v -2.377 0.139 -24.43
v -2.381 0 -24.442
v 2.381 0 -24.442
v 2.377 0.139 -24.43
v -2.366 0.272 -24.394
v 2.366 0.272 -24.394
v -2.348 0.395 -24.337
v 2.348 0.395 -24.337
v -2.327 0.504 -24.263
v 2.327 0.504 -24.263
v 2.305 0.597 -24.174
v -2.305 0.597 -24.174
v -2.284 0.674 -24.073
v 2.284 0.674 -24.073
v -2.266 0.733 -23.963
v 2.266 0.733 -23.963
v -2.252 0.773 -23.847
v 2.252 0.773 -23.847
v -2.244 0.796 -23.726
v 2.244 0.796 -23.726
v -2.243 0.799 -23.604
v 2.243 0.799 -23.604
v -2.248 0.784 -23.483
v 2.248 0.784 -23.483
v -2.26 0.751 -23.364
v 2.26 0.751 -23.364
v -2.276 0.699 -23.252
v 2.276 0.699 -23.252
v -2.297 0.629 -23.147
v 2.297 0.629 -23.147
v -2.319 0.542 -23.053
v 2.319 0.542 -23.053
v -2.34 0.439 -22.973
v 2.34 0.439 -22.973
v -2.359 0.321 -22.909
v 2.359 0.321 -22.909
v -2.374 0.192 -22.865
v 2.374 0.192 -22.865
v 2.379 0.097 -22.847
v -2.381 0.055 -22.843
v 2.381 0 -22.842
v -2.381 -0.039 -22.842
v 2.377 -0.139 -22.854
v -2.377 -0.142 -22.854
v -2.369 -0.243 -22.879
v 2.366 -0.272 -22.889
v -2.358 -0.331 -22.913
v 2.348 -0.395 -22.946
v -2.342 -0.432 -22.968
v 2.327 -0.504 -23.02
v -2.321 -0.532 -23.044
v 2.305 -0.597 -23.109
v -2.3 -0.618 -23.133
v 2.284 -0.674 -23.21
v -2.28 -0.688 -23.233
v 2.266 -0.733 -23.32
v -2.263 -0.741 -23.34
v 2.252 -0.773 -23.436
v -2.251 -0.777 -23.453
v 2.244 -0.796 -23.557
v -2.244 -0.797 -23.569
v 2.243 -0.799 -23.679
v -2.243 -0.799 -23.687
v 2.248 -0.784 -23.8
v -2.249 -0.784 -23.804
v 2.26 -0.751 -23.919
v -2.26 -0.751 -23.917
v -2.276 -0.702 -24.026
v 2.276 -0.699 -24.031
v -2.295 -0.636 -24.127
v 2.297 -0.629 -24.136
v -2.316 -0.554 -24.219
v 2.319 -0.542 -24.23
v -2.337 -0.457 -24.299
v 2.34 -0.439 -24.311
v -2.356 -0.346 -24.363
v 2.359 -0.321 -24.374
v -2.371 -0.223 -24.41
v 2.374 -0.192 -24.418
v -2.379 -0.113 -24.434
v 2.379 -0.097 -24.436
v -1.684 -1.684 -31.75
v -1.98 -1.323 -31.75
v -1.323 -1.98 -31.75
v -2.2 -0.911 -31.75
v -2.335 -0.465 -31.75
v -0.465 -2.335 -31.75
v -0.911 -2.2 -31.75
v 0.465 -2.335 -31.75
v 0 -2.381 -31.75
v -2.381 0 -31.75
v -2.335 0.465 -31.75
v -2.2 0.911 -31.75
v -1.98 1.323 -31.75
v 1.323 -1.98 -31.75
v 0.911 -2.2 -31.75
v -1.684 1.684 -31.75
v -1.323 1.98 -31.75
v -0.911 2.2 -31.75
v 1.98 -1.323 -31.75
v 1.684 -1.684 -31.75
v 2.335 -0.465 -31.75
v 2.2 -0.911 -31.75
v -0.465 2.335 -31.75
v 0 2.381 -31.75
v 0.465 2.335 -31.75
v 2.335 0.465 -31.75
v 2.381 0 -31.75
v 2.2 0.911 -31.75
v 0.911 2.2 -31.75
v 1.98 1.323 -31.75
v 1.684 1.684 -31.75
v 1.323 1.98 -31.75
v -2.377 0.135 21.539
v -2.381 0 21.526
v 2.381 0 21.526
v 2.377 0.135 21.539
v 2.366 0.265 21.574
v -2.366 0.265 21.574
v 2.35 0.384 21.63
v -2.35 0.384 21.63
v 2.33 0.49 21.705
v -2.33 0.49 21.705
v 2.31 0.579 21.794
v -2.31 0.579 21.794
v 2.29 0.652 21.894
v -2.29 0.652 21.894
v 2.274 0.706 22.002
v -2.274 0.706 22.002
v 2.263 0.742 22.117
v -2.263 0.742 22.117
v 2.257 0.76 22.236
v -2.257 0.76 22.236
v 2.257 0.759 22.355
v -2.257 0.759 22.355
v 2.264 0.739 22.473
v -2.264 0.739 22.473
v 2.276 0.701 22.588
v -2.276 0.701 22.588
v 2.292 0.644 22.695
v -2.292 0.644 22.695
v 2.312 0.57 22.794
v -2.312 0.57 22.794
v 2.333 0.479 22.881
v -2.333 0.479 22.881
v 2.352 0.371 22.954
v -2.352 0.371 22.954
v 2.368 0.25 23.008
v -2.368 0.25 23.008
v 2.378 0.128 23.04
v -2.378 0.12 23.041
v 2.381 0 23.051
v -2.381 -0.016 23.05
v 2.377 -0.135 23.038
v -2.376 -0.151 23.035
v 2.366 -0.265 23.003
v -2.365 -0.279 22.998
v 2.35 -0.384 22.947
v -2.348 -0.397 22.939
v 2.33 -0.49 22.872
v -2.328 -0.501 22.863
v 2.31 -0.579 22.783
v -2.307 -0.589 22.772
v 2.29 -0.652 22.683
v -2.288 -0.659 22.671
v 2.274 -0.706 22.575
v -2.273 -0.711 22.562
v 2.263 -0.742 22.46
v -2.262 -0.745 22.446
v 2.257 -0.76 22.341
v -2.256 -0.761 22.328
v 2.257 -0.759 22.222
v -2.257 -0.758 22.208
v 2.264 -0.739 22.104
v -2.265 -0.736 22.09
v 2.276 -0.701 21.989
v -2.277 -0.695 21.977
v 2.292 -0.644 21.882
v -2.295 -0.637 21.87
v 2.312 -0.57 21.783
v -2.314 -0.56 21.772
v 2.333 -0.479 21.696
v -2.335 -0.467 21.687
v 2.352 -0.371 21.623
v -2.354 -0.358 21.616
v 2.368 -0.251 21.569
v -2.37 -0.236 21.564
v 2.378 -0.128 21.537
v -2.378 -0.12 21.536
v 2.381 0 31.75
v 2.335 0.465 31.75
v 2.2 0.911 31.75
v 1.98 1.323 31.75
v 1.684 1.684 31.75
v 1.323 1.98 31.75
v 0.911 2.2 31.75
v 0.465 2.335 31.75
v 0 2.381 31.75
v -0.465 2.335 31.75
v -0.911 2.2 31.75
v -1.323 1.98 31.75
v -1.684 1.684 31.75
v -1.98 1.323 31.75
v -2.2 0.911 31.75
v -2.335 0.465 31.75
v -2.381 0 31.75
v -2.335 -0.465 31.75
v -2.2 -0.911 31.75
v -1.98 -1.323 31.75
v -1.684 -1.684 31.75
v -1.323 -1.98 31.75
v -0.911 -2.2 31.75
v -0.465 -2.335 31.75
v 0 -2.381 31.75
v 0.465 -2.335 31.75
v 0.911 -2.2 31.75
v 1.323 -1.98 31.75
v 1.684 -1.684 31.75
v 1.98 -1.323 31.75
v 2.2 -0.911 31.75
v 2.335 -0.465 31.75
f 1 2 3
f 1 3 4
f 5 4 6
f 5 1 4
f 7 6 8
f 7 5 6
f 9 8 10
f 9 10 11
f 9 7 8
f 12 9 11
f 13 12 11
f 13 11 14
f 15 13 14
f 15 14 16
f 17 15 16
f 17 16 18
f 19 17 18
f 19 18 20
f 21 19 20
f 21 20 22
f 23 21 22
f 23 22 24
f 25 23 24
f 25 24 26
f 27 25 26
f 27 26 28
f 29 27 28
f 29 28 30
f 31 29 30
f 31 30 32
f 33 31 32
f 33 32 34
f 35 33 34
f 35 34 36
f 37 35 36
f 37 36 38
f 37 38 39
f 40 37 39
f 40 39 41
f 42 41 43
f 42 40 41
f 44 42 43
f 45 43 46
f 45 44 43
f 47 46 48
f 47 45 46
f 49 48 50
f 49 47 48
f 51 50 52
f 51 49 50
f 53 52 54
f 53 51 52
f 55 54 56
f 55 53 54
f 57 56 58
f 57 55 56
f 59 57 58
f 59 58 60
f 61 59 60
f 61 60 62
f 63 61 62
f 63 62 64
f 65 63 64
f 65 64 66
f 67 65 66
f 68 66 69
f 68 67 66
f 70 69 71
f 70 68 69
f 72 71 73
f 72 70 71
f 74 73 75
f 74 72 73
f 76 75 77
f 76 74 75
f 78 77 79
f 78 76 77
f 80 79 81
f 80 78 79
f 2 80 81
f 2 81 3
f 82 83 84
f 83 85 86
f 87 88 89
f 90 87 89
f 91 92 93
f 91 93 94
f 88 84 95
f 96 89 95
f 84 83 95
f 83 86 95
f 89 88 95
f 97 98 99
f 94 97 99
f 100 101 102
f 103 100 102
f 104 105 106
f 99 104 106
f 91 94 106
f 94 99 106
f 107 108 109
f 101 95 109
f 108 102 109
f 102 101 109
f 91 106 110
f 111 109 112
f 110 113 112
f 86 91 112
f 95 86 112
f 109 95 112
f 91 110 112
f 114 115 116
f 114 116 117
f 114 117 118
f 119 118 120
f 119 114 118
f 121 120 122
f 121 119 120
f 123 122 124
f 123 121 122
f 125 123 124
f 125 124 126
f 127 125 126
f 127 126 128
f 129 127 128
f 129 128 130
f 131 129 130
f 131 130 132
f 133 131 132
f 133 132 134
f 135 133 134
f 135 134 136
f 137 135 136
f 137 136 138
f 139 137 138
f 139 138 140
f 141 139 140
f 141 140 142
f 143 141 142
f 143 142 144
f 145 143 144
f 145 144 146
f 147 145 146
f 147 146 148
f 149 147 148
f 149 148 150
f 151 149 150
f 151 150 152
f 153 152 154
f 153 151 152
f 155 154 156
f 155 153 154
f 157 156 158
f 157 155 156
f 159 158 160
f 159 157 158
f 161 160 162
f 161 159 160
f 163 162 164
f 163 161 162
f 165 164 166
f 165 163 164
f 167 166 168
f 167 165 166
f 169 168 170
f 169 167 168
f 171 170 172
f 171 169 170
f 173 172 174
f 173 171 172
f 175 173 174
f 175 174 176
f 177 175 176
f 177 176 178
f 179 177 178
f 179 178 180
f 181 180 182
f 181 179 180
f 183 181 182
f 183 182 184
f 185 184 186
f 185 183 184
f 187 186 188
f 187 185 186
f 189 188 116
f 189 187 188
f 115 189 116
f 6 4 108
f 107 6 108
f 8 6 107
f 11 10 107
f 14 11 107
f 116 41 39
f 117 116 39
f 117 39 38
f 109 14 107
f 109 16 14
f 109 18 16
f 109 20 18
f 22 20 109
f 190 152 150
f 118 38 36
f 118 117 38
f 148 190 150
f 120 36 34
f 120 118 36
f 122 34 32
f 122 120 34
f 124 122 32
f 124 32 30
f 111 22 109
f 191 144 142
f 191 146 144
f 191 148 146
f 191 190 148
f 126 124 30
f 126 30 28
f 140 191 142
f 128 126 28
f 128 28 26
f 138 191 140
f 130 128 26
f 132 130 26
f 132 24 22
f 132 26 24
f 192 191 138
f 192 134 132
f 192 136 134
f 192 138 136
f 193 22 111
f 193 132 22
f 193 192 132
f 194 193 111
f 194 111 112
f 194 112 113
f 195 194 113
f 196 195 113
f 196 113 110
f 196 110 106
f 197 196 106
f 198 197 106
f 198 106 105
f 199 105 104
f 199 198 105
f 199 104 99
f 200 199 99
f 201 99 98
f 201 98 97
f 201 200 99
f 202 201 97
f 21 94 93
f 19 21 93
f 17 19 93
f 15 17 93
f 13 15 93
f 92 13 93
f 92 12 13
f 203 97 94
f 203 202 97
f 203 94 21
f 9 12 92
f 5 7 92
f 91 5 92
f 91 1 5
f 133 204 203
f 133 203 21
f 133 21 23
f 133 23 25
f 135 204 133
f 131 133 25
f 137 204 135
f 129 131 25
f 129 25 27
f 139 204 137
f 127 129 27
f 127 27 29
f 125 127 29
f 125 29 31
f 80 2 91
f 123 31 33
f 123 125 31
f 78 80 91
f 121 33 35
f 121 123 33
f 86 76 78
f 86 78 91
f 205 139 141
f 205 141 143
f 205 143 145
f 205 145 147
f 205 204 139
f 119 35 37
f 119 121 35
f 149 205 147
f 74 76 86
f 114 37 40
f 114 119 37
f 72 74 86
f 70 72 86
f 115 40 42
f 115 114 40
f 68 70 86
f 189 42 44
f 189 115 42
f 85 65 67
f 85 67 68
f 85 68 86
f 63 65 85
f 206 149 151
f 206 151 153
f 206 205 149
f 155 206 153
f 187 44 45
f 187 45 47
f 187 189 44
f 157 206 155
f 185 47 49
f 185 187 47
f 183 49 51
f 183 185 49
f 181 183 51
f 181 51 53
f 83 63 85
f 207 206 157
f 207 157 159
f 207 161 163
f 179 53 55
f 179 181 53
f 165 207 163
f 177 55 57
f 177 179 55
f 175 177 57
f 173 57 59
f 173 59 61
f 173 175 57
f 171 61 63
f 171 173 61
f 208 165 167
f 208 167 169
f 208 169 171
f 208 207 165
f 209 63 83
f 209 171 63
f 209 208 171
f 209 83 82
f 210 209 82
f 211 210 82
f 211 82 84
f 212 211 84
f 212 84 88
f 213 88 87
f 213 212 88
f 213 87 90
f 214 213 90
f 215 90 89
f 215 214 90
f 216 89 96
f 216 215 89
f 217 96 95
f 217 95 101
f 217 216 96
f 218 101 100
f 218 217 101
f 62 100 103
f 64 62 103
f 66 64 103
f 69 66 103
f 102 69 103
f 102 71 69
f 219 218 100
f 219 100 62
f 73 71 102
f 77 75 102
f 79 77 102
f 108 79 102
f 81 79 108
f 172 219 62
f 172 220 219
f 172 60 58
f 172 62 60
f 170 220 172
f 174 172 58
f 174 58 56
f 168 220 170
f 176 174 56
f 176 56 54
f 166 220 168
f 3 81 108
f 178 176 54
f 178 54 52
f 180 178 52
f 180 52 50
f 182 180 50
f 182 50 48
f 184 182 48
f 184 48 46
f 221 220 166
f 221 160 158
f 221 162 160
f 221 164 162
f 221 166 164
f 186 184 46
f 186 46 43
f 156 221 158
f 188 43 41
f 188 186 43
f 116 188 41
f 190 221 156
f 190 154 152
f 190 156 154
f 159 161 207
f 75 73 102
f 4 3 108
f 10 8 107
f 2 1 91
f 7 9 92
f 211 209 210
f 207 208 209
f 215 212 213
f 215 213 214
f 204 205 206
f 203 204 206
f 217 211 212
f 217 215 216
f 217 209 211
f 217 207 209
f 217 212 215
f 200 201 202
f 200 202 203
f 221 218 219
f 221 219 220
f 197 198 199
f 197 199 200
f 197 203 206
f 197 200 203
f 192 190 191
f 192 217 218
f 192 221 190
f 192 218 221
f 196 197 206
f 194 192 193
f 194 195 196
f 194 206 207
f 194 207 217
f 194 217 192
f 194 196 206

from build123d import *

# Parameters (mm, degrees)
SKETCH1_R               = 2.38125
BOSS_EXTRUDE1_DEPTH     = 31.75
CUT_EXTRUDE3_DEPTH      = 32.928094261
CUT_EXTRUDE3_DEPTH_BACK = 32.928094261
SKETCH4_R               = 0.762
CUT_EXTRUDE4_DEPTH      = 32.928094375
CUT_EXTRUDE4_DEPTH_BACK = 32.928094375
SKETCH5_R               = 0.8001


with BuildPart() as part:
    # Sketch1 → Boss-Extrude1 (new, symmetric)
    with BuildSketch(Plane.XY):
        Circle(SKETCH1_R)
    extrude(amount=BOSS_EXTRUDE1_DEPTH, both=True)

    # Sketch4 → Cut-Extrude3 (cut, two sides: drawn at the far end of the back side and taken through both)
    with BuildSketch(Plane(origin=(0, 0, 0), x_dir=(0, 0, -1), z_dir=(1, 0, 0)).offset(-CUT_EXTRUDE3_DEPTH_BACK)):
        with Locations((-22.2885, 0)):
            Circle(SKETCH4_R)
    extrude(amount=CUT_EXTRUDE3_DEPTH + CUT_EXTRUDE3_DEPTH_BACK, mode=Mode.SUBTRACT)

    # Sketch5 → Cut-Extrude4 (cut, two sides: drawn at the far end of the back side and taken through both)
    with BuildSketch(Plane(origin=(0, 0, 0), x_dir=(0, 0, -1), z_dir=(1, 0, 0)).offset(-CUT_EXTRUDE4_DEPTH_BACK)):
        with Locations((23.641617285, 0)):
            Circle(SKETCH5_R)
    extrude(amount=CUT_EXTRUDE4_DEPTH + CUT_EXTRUDE4_DEPTH_BACK, mode=Mode.SUBTRACT)


solid = part.part
